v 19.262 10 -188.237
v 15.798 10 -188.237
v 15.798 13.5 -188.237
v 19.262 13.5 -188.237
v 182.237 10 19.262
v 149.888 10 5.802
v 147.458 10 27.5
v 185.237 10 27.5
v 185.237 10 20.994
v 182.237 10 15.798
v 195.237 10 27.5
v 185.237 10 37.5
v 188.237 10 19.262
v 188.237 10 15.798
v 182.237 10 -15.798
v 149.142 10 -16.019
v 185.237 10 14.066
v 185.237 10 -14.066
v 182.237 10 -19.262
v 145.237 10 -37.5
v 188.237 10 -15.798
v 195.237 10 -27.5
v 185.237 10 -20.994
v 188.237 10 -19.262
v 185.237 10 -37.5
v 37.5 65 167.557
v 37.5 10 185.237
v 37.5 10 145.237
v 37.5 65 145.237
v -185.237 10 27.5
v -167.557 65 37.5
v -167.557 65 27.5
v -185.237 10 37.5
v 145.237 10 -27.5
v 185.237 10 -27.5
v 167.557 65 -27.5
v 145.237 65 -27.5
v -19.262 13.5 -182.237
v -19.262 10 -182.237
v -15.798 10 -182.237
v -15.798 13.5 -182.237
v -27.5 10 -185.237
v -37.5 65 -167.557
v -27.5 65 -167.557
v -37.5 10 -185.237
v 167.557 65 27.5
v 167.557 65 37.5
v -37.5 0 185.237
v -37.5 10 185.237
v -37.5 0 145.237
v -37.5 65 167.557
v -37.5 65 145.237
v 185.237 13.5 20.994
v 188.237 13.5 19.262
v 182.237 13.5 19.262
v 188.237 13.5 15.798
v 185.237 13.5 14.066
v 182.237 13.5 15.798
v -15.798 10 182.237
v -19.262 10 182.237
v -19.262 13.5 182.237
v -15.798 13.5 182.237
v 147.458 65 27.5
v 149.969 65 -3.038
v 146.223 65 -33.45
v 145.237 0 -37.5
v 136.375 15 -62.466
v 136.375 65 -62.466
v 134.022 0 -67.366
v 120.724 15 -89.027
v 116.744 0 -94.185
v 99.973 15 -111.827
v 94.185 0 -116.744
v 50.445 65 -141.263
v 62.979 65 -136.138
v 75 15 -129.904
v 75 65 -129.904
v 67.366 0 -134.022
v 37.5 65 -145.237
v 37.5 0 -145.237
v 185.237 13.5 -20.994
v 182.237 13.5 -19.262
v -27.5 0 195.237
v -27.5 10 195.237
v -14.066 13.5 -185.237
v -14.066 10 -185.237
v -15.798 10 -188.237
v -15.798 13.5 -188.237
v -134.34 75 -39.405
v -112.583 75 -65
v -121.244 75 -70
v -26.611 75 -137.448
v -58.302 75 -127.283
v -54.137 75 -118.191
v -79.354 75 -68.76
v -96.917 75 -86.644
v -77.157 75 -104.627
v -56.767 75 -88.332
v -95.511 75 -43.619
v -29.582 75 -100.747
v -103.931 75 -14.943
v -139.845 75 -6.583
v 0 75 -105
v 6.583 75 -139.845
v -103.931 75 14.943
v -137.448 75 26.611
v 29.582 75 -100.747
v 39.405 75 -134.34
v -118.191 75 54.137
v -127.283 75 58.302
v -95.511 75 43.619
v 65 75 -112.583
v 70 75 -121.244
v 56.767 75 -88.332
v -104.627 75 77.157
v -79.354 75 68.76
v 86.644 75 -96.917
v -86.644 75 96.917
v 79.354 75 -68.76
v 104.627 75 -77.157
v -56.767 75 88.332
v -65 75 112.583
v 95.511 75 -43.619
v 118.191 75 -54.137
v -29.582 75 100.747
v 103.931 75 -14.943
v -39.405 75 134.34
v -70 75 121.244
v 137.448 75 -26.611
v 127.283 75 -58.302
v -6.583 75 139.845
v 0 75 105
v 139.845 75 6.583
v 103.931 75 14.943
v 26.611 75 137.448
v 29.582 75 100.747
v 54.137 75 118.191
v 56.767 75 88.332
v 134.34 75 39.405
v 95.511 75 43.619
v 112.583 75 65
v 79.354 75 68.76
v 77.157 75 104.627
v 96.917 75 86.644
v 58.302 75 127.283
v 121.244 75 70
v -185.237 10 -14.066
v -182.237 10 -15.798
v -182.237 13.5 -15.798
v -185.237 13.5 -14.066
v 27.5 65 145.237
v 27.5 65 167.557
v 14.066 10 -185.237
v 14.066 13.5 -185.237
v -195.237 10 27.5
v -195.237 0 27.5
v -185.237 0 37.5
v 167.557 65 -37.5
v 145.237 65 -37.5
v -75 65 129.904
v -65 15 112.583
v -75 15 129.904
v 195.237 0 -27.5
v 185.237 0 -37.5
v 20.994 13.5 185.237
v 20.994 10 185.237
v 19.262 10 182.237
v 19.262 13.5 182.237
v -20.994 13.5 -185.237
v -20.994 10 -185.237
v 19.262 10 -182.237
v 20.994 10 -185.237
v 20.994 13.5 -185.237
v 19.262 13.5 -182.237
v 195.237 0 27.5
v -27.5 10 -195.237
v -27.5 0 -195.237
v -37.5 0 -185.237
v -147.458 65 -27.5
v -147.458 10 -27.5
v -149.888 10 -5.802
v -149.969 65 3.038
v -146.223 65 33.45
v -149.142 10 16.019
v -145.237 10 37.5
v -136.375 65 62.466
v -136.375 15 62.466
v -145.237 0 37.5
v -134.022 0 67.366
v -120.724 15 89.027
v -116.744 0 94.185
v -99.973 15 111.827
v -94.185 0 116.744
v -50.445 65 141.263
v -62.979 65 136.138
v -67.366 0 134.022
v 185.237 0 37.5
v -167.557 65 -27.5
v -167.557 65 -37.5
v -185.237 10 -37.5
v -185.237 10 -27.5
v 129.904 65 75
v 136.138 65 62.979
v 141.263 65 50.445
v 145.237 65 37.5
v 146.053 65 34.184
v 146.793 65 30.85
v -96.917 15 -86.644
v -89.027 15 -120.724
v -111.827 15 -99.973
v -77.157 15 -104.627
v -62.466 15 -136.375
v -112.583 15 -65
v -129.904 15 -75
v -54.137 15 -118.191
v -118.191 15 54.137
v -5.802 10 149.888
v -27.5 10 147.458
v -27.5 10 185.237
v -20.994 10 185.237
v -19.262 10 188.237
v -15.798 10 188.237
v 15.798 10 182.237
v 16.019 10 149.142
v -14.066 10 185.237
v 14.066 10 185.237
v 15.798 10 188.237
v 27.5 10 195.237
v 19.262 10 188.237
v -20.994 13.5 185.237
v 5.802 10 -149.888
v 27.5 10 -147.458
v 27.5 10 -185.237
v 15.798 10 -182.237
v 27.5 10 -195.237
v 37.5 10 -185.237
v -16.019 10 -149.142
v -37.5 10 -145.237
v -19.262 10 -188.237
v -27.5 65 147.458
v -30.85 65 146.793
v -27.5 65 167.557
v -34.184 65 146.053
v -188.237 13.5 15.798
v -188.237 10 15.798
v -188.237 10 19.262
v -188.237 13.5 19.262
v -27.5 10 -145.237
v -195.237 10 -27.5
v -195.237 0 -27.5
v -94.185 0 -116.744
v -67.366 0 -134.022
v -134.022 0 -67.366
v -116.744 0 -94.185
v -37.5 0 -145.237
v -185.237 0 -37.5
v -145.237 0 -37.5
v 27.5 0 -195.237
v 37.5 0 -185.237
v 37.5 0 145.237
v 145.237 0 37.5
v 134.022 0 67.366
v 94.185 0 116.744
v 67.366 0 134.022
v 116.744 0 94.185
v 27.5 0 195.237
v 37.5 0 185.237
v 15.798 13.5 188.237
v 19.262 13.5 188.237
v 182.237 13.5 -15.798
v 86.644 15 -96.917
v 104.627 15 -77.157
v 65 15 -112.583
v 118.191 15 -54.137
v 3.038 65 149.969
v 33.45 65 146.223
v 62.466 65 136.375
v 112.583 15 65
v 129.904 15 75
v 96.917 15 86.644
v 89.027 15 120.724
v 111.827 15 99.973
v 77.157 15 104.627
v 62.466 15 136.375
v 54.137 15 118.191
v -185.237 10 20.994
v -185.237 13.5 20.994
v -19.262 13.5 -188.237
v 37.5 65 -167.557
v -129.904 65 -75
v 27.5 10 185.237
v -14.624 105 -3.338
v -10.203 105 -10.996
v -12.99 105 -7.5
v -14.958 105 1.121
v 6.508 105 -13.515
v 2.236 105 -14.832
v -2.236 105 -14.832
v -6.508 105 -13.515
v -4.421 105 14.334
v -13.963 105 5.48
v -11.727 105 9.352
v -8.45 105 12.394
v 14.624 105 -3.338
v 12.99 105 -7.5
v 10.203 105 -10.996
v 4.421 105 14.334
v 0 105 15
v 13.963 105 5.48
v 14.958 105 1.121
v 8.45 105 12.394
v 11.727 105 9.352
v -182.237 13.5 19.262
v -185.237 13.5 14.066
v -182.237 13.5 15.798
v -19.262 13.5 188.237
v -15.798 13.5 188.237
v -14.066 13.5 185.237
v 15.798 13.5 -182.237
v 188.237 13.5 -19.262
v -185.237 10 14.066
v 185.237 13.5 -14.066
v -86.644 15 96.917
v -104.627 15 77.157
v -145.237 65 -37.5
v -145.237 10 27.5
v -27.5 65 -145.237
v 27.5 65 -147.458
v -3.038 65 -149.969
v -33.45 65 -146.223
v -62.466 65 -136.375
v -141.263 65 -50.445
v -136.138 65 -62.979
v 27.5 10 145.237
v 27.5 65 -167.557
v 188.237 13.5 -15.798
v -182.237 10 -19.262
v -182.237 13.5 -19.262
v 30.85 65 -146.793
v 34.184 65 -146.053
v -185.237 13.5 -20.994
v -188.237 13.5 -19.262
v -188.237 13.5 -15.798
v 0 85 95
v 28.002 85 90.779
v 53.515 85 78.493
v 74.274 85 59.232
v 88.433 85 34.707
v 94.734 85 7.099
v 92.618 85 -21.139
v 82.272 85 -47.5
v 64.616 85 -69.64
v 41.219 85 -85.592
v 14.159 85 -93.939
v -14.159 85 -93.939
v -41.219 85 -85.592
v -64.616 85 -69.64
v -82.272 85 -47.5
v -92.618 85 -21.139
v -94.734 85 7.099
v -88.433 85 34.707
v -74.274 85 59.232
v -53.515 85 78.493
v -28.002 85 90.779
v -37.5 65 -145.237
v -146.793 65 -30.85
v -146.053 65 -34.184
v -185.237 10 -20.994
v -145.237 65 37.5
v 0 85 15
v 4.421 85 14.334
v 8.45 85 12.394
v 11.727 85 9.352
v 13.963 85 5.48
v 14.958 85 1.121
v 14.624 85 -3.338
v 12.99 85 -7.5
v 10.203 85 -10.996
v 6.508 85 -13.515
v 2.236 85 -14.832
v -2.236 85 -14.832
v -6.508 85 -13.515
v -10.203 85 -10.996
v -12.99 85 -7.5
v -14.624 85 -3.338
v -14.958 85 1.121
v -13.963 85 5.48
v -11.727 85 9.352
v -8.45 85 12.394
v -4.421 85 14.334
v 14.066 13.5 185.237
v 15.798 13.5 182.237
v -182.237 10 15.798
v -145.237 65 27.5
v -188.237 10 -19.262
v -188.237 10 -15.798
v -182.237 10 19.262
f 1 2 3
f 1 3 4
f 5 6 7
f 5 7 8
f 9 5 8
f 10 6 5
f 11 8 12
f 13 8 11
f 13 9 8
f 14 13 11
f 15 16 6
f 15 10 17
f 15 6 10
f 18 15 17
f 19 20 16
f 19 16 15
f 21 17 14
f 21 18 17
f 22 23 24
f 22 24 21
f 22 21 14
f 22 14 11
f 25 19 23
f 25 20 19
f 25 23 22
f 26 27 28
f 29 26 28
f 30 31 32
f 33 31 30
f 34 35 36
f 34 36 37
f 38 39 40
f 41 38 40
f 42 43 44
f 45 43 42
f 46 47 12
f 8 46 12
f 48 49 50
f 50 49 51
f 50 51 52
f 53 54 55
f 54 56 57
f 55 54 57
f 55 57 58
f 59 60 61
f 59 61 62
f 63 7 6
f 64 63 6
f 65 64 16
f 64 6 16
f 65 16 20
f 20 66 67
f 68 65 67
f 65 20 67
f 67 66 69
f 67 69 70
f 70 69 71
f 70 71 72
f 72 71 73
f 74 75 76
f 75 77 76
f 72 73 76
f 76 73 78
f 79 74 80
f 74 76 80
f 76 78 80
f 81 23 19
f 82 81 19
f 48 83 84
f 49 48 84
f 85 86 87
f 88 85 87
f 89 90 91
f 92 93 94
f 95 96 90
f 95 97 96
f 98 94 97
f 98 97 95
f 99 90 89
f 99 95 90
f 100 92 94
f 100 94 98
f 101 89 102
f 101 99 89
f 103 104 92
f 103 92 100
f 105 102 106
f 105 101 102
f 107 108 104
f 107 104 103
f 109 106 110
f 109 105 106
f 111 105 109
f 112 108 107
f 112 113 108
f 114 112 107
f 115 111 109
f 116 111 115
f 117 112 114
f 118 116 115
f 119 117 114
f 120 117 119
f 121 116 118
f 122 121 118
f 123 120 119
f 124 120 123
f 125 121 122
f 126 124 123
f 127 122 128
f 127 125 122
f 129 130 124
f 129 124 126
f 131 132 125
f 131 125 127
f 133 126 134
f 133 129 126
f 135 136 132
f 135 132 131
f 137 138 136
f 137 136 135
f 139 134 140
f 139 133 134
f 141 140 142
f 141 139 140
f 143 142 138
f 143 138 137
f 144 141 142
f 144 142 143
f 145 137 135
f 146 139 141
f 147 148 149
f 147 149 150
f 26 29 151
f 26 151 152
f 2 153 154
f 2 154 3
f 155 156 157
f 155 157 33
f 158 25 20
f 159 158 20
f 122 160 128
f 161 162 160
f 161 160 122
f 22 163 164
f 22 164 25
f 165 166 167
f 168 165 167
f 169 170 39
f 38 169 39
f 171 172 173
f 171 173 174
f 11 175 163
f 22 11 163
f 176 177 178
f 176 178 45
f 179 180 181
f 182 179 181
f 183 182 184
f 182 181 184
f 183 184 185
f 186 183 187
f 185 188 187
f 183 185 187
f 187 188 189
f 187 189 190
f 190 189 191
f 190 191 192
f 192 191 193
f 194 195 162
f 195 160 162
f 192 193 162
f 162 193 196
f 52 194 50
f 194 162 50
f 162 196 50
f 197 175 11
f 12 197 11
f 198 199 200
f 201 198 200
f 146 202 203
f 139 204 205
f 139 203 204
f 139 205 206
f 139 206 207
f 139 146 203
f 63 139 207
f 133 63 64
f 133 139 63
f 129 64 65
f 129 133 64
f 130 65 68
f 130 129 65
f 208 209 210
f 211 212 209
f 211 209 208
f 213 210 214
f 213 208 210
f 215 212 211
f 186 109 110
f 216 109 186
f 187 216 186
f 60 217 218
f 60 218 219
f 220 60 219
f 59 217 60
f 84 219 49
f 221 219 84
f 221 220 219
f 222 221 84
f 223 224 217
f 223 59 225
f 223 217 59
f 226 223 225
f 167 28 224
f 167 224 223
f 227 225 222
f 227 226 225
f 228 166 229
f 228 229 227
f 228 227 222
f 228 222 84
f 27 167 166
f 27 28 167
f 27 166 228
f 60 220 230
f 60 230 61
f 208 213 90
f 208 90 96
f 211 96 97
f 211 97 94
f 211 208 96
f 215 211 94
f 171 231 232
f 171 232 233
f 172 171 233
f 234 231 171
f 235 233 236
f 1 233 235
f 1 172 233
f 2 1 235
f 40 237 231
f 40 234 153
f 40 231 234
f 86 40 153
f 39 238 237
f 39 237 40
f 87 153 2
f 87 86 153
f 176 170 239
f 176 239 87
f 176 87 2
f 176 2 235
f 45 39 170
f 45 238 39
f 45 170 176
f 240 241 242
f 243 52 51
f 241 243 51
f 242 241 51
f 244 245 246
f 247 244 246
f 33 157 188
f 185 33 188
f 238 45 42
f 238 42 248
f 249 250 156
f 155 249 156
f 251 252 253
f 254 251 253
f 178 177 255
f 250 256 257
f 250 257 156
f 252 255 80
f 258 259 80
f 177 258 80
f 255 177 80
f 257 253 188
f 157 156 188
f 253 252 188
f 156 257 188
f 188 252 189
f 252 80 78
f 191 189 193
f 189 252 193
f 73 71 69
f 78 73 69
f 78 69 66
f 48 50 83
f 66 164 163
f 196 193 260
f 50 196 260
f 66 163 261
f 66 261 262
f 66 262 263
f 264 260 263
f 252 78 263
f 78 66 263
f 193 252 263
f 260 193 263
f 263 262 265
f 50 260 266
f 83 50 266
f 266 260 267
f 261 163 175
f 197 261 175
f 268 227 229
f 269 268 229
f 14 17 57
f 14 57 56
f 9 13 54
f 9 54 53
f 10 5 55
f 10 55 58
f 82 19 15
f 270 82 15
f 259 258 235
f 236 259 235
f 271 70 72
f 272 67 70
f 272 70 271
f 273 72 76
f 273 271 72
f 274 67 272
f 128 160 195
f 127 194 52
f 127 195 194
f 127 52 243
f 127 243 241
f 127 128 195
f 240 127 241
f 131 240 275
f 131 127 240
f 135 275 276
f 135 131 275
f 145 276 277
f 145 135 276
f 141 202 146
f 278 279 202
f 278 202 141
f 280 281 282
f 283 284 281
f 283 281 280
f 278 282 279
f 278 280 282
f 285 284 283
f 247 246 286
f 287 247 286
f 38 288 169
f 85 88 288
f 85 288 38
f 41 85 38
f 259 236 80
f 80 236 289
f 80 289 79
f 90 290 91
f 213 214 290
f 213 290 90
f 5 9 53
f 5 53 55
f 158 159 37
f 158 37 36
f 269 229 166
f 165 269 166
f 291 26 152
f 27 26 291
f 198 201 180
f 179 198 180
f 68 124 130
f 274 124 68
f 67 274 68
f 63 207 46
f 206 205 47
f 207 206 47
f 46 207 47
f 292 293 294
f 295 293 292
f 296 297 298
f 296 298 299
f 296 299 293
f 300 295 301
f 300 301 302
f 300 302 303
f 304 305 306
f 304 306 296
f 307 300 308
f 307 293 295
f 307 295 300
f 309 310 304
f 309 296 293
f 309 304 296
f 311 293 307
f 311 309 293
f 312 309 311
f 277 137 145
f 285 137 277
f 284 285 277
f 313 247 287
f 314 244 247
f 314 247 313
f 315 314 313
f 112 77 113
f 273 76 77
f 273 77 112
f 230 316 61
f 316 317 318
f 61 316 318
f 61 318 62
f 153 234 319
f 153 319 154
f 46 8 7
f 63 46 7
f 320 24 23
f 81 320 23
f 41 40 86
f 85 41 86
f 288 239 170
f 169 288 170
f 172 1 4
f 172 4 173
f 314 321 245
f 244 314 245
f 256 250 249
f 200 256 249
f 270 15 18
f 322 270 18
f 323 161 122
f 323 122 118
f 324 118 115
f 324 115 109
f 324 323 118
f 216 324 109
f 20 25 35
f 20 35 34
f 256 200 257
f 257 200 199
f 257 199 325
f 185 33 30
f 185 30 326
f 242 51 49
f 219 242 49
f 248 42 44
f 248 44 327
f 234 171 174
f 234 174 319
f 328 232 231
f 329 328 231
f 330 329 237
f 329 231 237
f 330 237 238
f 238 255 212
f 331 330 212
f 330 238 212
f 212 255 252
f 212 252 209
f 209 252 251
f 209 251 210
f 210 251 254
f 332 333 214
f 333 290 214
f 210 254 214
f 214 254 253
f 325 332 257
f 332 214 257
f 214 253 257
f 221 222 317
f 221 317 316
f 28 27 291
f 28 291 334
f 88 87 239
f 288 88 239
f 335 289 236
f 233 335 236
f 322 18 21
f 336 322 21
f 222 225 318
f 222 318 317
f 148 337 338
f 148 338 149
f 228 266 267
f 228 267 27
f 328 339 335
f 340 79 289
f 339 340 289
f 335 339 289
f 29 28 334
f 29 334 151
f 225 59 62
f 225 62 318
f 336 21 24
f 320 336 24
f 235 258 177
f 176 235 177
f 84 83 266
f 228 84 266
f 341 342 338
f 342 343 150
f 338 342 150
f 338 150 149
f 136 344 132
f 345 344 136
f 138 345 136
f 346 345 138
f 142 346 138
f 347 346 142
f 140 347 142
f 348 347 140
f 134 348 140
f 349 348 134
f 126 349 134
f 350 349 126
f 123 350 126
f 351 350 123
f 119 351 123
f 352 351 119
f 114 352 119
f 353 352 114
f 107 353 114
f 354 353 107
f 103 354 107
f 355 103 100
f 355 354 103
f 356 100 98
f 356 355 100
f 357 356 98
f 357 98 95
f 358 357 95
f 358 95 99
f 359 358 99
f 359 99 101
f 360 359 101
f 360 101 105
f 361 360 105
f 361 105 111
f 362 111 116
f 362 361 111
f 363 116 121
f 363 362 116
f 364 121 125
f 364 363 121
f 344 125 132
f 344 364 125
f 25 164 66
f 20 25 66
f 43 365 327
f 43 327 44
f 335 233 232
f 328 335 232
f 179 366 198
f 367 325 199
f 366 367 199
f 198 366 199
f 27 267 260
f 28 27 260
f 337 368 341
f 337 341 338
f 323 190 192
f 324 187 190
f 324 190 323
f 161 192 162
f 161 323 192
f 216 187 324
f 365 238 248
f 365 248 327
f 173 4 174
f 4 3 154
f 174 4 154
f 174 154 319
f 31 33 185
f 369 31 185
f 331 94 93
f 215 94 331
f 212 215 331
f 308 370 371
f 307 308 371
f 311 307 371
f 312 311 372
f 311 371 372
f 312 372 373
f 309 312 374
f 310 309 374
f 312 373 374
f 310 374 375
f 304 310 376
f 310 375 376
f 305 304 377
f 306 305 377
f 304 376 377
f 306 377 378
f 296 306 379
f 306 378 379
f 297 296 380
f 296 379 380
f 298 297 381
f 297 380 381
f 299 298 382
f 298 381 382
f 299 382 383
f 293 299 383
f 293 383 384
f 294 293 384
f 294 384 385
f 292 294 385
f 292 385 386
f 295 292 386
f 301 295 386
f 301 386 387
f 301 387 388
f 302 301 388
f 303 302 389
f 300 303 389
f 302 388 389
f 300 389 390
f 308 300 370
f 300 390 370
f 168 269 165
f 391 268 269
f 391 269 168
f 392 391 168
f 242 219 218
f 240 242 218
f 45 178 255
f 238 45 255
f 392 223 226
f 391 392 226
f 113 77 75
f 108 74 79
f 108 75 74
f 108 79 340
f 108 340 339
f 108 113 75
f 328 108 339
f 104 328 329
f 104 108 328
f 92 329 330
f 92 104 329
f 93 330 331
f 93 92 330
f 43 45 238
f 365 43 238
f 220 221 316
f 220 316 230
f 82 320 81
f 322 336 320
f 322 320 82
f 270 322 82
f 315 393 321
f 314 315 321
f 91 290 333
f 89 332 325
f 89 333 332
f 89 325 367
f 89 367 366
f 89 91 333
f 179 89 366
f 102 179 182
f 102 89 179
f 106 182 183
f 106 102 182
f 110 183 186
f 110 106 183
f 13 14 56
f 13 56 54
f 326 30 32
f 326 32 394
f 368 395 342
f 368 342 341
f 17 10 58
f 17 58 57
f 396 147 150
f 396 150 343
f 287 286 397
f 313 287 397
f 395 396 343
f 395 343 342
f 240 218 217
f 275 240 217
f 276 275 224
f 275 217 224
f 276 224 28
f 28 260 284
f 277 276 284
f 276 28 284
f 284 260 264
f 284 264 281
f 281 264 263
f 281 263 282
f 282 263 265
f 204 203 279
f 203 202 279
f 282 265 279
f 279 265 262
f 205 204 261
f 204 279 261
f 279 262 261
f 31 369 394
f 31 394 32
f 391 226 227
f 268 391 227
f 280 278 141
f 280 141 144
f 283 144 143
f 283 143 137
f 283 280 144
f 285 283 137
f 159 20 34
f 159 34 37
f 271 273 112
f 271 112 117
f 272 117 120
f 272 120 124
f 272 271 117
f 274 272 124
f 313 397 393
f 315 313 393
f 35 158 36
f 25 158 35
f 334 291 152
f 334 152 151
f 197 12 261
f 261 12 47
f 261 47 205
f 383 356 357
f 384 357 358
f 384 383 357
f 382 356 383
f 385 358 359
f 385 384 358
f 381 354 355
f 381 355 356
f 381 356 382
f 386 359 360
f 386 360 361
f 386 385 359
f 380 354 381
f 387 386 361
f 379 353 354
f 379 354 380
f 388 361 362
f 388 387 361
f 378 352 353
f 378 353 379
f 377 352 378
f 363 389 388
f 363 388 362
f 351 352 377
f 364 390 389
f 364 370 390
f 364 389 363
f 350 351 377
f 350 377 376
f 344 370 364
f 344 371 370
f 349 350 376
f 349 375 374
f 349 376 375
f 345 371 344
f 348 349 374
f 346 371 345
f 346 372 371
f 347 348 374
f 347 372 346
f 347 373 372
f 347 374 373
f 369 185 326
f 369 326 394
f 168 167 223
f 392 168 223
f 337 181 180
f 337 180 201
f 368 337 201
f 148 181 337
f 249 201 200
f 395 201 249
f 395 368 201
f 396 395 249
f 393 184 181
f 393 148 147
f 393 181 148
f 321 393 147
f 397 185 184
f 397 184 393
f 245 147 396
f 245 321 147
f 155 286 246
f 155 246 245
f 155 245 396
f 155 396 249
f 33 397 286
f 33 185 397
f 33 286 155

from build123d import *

# Parameters (mm, degrees)
SKETCH1_R           = 150
BOSS_EXTRUDE1_DEPTH = 75
CHAMFER1_SIZE       = 10
BOSS_EXTRUDE2_DEPTH = 10
CHAMFER2_SIZE       = 10
BOSS_EXTRUDE3_DEPTH = 10
BOSS_EXTRUDE4_DEPTH = 3.5
CIRPATTERN8_COUNT   = 4
CUT_EXTRUDE1_START  = -60
CUT_EXTRUDE1_DEPTH  = 60
SKETCH6_R           = 110
BOSS_EXTRUDE5_DEPTH = 10
CHAMFER3_SIZE       = 15
SKETCH7_R           = 15
BOSS_EXTRUDE6_DEPTH = 20
CIRPATTERN9_COUNT   = 4


with BuildPart() as part:
    # Sketch1 → Boss-Extrude1 (new body)
    with BuildSketch(Plane(origin=(0, 0, 0), x_dir=(1, 0, 0), z_dir=(0, 1, 0))):
        with Locations(Location((0, 0, 0), (0, 0, 270))):
            Circle(SKETCH1_R)
    extrude(amount=BOSS_EXTRUDE1_DEPTH)

    # Chamfer1
    chamfer1_edges = [part.edges().sort_by_distance(p)[0] for p in [
        (0, 75, -150),
    ]]
    chamfer(chamfer1_edges, length=CHAMFER1_SIZE)

    # Sketch2 → Boss-Extrude2 (add)
    with BuildSketch(Plane.XZ):
        with BuildLine():
            Line((-145.236875483, -37.5), (-195.236875483, -37.5))
            Line((-195.236875483, -37.5), (-195.236875483, 37.5))
            Line((-195.236875483, 37.5), (-145.236875483, 37.5))
            ThreePointArc((-145.236875483, 37.5), (-150, 0), (-145.236875483, -37.5))
        make_face()
    extrude(amount=-BOSS_EXTRUDE2_DEPTH)

    # Chamfer2
    chamfer2_edges = [part.edges().sort_by_distance(p)[0] for p in [
        (-195.236875483, 5, -37.5),
        (-195.236875483, 5, 37.5),
    ]]
    chamfer(chamfer2_edges, length=CHAMFER2_SIZE)

    # Sketch4 → Boss-Extrude4 (add)
    with BuildSketch(Plane(origin=(0, 10, 0), x_dir=(1, 0, 0), z_dir=(0, 1, 0))):
        Polygon((-185.236875483, -14.0657227), (-188.236875483, -15.797773507), (-188.236875483, -19.261875122), (-185.236875483, -20.99392593), (-182.236875483, -19.261875122), (-182.236875483, -15.797773507), align=None)
    boss_extrude4 = extrude(amount=BOSS_EXTRUDE4_DEPTH)


with BuildPart() as body_2:
    # Sketch3 → Boss-Extrude3 (new body)
    with BuildSketch(Plane.XY.offset(37.5)):
        Polygon((-185.236875483, 10), (-145.236875483, 10), (-145.236875483, 65), (-167.556875483, 65), align=None)
    boss_extrude3 = extrude(amount=-BOSS_EXTRUDE3_DEPTH)


with BuildPart() as part_1:
    add(part.part)

    # Mirror1: Boss-Extrude3, Boss-Extrude4 across plane
    add(boss_extrude3.mirror(Plane.XY))
    add(boss_extrude4.mirror(Plane.XY))


with BuildPart() as cirpattern8_1:
    # CirPattern8: pattern copy
    add(body_2.part.rotate(Axis((0, 0, 0), (0, 1, 0)), 1 * 360 / CIRPATTERN8_COUNT))


with BuildPart() as cirpattern8_2:
    # CirPattern8: pattern copy
    add(body_2.part.rotate(Axis((0, 0, 0), (0, 1, 0)), 2 * 360 / CIRPATTERN8_COUNT))


with BuildPart() as cirpattern8_3:
    # CirPattern8: pattern copy
    add(body_2.part.rotate(Axis((0, 0, 0), (0, 1, 0)), 3 * 360 / CIRPATTERN8_COUNT))


with BuildPart() as cirpattern8_4:
    # CirPattern8: pattern copy
    add(part_1.part.rotate(Axis((0, 0, 0), (0, 1, 0)), 1 * 360 / CIRPATTERN8_COUNT))


with BuildPart() as cirpattern8_5:
    # CirPattern8: pattern copy
    add(part_1.part.rotate(Axis((0, 0, 0), (0, 1, 0)), 2 * 360 / CIRPATTERN8_COUNT))


with BuildPart() as cirpattern8_6:
    # CirPattern8: pattern copy
    add(part_1.part.rotate(Axis((0, 0, 0), (0, 1, 0)), 3 * 360 / CIRPATTERN8_COUNT))


with BuildPart() as cut_extrude1_tool:
    # Sketch5 → Cut-Extrude1 (new body)
    with BuildSketch(Plane(origin=(0, 75, 0), x_dir=(1, 0, 0), z_dir=(0, 1, 0)).offset(CUT_EXTRUDE1_START)):
        with BuildLine():
            Line((-118.191247264, -54.137132082), (-136.374516074, -62.465921634))
            ThreePointArc((-136.374516074, -62.465921634), (-110.935854111, -100.96155839), (-75, -129.903810568))
            Line((-75, -129.903810568), (-65, -112.583302492))
            ThreePointArc((-65, -112.583302492), (-96.144406896, -87.500017272), (-118.191247264, -54.137132082))
        make_face()
    cut_extrude1 = extrude(amount=CUT_EXTRUDE1_DEPTH)


with BuildPart() as part_2:
    add(part_1.part)

    # Cut-Extrude1: cut by cut_extrude1_tool
    add(cut_extrude1_tool.part, mode=Mode.SUBTRACT)



with BuildPart() as cirpattern8_4_1:
    add(cirpattern8_4.part)

    # Cut-Extrude1: cut by cut_extrude1_tool
    add(cut_extrude1_tool.part, mode=Mode.SUBTRACT)


with BuildPart() as cirpattern8_5_1:
    add(cirpattern8_5.part)

    # Cut-Extrude1: cut by cut_extrude1_tool
    add(cut_extrude1_tool.part, mode=Mode.SUBTRACT)


with BuildPart() as cirpattern8_6_1:
    add(cirpattern8_6.part)

    # Cut-Extrude1: cut by cut_extrude1_tool
    add(cut_extrude1_tool.part, mode=Mode.SUBTRACT)


with BuildPart() as part_3:
    add(part_2.part)

    add(cirpattern8_4_1.part)  # Boss-Extrude5 merges CirPattern8_4

    add(cirpattern8_5_1.part)  # Boss-Extrude5 merges CirPattern8_5

    add(cirpattern8_6_1.part)  # Boss-Extrude5 merges CirPattern8_6
    # Sketch6 → Boss-Extrude5 (add)
    with BuildSketch(Plane(origin=(0, 75, 0), x_dir=(1, 0, 0), z_dir=(0, 1, 0))):
        with Locations(Location((0, 0, 0), (0, 0, 270))):
            Circle(SKETCH6_R)
    extrude(amount=BOSS_EXTRUDE5_DEPTH)

    # Chamfer3
    # the kernel refuses this chamfer: 15 mm, written as the material it takes off along each edge
    with BuildSketch(Plane(origin=(0, 85, 0), x_dir=(0, 0, 1), z_dir=(-1, 0, 0))) as chamfer3_piece_1_section:
        Polygon((110, -CHAMFER3_SIZE), (110 - CHAMFER3_SIZE, 0), (110, 0), align=None)
    chamfer3_piece_1 = revolve(axis=Axis((0, 85, 0), (0, 1, 0)), mode=Mode.PRIVATE)
    chamfer3_piece_1 = split(chamfer3_piece_1, bisect_by=Plane(origin=(0, 75, -100.081022807), z_dir=(0, 1, 0)), keep=Keep.TOP, mode=Mode.PRIVATE)
    add(chamfer3_piece_1, mode=Mode.SUBTRACT)

    # Sketch7 → Boss-Extrude6 (add)
    with BuildSketch(Plane(origin=(0, 85, 0), x_dir=(1, 0, 0), z_dir=(0, 1, 0))):
        with Locations(Location((0, 0, 0), (0, 0, 270))):
            Circle(SKETCH7_R)
    extrude(amount=BOSS_EXTRUDE6_DEPTH)

    # CirPattern9: Cut-Extrude1 ×4 about axis
    cirpattern9_axis = Axis((0, 0, 0), (0, -1, 0))
    for i in range(1, CIRPATTERN9_COUNT):
        add(cut_extrude1.rotate(cirpattern9_axis, i * 360 / CIRPATTERN9_COUNT), mode=Mode.SUBTRACT)


solid = Compound([body_2.part, cirpattern8_1.part, cirpattern8_2.part, cirpattern8_3.part, part_3.part])
